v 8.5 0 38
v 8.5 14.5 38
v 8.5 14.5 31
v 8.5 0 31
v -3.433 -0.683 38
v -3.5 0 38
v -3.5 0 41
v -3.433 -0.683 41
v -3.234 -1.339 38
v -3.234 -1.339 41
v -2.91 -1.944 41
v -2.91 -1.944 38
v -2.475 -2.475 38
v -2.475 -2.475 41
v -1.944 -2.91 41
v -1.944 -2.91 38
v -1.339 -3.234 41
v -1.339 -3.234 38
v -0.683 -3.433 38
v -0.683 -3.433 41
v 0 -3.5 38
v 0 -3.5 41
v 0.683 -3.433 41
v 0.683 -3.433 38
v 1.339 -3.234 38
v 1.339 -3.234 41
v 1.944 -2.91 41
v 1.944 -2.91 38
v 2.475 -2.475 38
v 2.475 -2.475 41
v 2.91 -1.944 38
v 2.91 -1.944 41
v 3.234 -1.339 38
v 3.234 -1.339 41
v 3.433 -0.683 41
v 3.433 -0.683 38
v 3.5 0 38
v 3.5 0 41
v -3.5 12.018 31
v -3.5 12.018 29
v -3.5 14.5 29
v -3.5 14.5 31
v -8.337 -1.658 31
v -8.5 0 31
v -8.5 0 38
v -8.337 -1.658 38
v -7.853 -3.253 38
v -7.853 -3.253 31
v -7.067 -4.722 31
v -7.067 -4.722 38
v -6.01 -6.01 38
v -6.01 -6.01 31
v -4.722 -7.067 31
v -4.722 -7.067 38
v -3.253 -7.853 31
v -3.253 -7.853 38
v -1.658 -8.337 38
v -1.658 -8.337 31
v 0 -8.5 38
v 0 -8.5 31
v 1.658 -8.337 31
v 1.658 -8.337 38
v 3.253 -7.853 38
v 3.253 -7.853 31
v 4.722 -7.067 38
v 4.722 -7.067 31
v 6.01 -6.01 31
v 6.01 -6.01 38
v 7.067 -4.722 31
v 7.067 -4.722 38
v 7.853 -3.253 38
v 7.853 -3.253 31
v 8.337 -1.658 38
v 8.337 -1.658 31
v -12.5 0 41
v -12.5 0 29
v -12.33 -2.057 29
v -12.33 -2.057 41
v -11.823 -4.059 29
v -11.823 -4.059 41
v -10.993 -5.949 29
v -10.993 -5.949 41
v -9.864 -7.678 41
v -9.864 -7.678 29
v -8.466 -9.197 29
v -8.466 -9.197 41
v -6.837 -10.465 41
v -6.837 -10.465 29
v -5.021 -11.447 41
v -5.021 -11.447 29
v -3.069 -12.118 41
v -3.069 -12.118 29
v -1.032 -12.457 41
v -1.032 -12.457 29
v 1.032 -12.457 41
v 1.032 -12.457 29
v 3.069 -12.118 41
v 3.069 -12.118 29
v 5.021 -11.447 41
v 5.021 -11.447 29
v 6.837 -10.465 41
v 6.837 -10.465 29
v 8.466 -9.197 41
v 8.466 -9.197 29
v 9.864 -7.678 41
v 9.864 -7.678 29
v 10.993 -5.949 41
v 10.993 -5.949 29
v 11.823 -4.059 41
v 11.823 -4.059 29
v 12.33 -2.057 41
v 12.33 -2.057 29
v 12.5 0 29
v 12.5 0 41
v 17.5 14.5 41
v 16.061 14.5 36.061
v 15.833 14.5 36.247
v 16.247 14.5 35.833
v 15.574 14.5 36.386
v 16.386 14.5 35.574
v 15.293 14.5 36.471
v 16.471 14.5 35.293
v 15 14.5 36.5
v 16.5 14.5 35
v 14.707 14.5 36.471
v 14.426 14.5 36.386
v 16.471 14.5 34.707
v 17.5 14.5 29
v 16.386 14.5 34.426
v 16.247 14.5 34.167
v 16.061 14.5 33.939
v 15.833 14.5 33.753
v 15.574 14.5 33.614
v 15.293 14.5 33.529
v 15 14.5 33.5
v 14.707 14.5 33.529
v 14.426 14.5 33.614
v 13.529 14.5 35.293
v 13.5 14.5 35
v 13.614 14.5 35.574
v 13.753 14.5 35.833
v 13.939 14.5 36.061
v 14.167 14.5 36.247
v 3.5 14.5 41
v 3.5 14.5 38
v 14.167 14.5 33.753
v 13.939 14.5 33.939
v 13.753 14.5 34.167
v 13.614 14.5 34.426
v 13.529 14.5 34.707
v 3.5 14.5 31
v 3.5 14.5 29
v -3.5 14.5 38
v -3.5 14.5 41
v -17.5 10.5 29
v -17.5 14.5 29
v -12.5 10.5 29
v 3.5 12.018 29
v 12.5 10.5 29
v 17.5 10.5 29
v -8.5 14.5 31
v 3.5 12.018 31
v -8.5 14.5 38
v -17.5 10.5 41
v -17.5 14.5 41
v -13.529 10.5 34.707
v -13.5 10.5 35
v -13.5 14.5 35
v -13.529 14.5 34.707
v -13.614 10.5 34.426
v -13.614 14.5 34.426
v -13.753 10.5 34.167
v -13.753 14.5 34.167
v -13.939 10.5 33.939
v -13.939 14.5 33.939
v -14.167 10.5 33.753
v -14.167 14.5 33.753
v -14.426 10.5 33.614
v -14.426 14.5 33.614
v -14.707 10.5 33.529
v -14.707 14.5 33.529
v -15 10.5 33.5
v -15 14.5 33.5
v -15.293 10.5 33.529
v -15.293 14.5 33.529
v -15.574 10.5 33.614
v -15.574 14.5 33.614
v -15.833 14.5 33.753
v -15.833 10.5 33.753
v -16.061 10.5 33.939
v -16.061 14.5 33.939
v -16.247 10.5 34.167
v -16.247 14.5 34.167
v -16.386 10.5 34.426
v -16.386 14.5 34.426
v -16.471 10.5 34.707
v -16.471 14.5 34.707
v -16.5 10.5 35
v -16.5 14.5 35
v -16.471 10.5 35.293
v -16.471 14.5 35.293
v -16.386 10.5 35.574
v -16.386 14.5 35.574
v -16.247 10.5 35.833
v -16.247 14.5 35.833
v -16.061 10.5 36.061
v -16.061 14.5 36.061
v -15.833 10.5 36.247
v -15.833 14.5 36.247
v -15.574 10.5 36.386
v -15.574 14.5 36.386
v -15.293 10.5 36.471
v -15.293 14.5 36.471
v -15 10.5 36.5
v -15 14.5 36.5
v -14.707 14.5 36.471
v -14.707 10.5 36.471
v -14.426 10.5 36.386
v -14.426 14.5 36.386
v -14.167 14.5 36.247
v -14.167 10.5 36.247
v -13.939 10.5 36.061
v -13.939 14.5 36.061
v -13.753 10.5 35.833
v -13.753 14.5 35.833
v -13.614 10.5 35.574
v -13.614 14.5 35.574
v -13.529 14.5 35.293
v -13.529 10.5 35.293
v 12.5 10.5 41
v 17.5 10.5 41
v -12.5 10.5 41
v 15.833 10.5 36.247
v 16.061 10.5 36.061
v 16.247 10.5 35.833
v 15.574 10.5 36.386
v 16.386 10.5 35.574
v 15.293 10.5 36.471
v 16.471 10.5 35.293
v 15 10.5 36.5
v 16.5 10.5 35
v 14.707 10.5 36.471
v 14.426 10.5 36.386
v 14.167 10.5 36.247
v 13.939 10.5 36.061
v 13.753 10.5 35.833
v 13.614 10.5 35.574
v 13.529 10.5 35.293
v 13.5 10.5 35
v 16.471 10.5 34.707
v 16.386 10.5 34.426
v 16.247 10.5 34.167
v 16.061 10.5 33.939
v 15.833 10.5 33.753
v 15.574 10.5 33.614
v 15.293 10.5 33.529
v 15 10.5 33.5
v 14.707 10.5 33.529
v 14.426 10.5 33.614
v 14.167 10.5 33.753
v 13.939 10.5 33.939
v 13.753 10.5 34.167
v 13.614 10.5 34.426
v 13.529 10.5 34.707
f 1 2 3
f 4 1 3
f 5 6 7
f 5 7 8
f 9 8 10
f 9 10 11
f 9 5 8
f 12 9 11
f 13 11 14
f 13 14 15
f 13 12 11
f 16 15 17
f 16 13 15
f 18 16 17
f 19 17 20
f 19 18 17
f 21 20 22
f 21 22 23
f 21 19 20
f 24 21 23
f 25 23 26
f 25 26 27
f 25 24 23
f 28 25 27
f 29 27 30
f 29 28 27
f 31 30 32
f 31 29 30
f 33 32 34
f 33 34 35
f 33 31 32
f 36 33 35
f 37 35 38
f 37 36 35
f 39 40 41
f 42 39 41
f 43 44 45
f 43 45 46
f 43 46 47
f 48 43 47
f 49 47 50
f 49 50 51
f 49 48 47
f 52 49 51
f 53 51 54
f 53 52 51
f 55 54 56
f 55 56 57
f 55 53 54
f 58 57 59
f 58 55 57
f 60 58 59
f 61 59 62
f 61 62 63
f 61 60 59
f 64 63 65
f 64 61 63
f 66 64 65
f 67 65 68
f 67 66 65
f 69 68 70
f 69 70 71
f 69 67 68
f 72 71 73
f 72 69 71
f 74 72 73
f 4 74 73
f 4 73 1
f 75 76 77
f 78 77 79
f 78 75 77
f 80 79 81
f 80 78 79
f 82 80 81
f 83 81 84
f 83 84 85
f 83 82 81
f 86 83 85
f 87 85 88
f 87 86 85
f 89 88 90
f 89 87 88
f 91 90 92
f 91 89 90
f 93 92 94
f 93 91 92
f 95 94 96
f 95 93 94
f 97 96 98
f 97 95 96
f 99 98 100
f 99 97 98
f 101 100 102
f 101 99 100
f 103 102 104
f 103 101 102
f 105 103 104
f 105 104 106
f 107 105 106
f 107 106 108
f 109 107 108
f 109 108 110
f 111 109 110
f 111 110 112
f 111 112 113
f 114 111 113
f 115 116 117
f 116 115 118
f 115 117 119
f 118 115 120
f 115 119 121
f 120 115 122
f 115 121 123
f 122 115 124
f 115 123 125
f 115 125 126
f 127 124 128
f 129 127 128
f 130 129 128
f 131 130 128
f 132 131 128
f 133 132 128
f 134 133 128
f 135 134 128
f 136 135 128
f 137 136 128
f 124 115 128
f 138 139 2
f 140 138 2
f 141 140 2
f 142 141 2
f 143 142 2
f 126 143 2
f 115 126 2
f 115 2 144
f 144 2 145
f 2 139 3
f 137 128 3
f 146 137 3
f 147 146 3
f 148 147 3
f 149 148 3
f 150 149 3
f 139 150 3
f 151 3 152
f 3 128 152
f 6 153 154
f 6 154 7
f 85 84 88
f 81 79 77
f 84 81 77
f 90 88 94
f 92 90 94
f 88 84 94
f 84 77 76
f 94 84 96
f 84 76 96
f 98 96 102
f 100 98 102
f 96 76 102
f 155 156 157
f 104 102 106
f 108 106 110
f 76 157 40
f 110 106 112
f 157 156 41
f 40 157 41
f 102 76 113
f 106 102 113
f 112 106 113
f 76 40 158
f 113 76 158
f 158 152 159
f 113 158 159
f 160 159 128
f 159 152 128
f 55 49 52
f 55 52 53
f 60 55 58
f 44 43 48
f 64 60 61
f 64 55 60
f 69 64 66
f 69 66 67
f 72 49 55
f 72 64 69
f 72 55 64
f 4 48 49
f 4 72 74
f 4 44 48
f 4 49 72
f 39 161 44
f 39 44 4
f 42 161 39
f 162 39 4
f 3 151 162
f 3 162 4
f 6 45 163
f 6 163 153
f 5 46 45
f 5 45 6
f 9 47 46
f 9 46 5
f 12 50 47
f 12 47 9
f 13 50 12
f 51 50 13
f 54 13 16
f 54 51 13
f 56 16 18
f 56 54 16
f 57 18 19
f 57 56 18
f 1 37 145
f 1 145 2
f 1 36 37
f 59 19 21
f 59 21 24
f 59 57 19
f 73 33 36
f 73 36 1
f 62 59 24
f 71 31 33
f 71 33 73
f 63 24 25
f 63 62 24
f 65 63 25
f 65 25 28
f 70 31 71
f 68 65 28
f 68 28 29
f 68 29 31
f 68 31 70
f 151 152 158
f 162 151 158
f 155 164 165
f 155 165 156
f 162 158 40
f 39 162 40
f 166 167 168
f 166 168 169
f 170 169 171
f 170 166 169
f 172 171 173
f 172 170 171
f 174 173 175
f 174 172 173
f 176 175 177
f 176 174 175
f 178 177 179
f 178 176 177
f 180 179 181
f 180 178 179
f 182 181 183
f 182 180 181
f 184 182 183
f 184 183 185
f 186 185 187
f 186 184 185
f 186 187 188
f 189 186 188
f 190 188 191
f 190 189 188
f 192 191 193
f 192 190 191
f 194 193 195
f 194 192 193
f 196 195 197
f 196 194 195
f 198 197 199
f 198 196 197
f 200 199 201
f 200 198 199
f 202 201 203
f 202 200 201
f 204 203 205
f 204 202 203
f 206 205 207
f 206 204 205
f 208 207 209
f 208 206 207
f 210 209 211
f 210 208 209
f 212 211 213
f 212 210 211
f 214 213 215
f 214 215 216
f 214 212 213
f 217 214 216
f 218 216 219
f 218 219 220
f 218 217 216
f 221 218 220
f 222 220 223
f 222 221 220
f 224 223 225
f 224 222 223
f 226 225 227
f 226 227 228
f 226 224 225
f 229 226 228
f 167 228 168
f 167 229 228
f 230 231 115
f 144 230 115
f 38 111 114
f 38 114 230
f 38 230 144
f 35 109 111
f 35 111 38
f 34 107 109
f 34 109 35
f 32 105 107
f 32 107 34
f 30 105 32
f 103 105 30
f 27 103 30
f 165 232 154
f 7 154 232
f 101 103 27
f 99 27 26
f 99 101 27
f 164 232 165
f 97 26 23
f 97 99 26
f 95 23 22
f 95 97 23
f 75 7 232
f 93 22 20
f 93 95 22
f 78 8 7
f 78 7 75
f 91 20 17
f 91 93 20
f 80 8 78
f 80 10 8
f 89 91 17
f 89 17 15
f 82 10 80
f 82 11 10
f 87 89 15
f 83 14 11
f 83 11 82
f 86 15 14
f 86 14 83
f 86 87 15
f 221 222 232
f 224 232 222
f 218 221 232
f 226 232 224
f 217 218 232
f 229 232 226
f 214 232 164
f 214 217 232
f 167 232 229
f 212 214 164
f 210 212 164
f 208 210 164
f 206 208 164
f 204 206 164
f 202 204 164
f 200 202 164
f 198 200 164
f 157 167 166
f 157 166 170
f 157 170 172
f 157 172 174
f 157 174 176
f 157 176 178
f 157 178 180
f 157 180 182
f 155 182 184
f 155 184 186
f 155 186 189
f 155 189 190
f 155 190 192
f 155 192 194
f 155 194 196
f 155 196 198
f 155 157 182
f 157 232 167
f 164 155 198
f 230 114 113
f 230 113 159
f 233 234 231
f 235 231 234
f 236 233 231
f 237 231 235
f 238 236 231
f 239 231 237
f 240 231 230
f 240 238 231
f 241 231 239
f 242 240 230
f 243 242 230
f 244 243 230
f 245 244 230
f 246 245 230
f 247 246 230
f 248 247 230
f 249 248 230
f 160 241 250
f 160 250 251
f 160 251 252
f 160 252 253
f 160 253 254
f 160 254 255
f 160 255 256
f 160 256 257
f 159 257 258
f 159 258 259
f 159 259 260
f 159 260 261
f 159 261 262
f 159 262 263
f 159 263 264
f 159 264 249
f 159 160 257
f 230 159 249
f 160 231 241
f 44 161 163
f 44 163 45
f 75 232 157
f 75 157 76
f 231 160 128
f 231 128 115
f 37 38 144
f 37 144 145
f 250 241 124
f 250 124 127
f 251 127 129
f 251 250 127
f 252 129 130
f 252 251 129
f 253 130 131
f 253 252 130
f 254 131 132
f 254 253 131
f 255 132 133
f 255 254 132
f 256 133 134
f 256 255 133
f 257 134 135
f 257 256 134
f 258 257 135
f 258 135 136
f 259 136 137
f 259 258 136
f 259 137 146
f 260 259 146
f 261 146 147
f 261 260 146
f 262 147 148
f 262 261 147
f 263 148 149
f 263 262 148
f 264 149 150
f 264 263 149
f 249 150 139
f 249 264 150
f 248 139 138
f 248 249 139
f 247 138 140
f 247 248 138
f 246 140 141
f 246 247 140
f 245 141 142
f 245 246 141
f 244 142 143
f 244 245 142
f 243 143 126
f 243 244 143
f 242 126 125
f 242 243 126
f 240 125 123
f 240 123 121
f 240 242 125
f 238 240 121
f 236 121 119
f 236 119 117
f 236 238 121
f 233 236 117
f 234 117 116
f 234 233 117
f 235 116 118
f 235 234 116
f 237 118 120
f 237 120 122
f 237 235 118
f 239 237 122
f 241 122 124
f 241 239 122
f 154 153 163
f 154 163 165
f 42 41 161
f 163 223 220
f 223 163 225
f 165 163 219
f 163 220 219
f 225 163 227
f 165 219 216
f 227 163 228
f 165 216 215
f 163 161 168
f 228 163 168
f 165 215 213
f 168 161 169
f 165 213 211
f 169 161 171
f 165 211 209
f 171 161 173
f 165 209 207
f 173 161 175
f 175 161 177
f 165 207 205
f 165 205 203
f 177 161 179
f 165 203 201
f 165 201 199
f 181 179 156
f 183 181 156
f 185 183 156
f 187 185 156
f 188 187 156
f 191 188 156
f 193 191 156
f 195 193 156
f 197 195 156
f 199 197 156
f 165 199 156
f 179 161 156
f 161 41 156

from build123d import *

# Parameters (mm, degrees)
SALIENTE_EXTRUIR1_DEPTH    = 38
SALIENTE_EXTRUIR2_DEPTH    = 3
SALIENTE_EXTRUIR3_DEPTH    = 2
CROQUIS4_R                 = 1.5
SALIENTE_EXTRUIR4_DEPTH    = 4
CROQUIS5_W                 = 35
CROQUIS5_H                 = 31
CORTAR_EXTRUIR1_DEPTH      = 24
CORTAR_EXTRUIR1_DEPTH_BACK = 5
SALIENTE_EXTRUIR5_DEPTH    = 2


with BuildPart() as part:
    # Croquis1 → Saliente-Extruir1 (new body)
    with BuildSketch(Plane.XY):
        with BuildLine():
            Line((10.5, 10.5), (12.5, 10.5))
            Line((12.5, 10.5), (12.5, 0))
            ThreePointArc((12.5, 0), (0, -12.5), (-12.5, 0))
            Line((-12.5, 0), (-12.5, 10.5))
            Line((-12.5, 10.5), (-10.5, 10.5))
            Line((-10.5, 10.5), (-8.5, 10.5))
            Line((-8.5, 10.5), (-8.5, 0))
            ThreePointArc((-8.5, 0), (0, -8.5), (8.5, 0))
            Line((8.5, 0), (8.5, 10.5))
            Line((8.5, 10.5), (10.5, 10.5))
        make_face()
    extrude(amount=SALIENTE_EXTRUIR1_DEPTH)

    # Croquis2 → Saliente-Extruir2 (add)
    with BuildSketch(Plane.XY.offset(38)):
        with BuildLine():
            Line((-12.5, 10.5), (-3.5, 10.5))
            Line((-3.5, 10.5), (-3.5, 0))
            ThreePointArc((-3.5, 0), (0, -3.5), (3.5, 0))
            Line((3.5, 0), (3.5, 10.5))
            Line((3.5, 10.5), (12.5, 10.5))
            Line((12.5, 10.5), (12.5, 0))
            ThreePointArc((12.5, 0), (0, -12.5), (-12.5, 0))
            Line((-12.5, 0), (-12.5, 10.5))
        make_face()
    extrude(amount=SALIENTE_EXTRUIR2_DEPTH)

    # Croquis3 → Saliente-Extruir3 (add)
    with BuildSketch(Plane(origin=(0, 0, 0), x_dir=(-1, 0, 0), z_dir=(0, 0, -1))):
        with BuildLine():
            Line((-12.5, 10.5), (12.5, 10.5))
            Line((12.5, 10.5), (12.5, 0))
            ThreePointArc((12.5, 0), (0, -12.5), (-12.5, 0))
            Line((-12.5, 0), (-12.5, 10.5))
        make_face()
    extrude(amount=SALIENTE_EXTRUIR3_DEPTH)

    # Croquis4 → Saliente-Extruir4 (add)
    with BuildSketch(Plane(origin=(0, 10.5, 0), x_dir=(1, 0, 0), z_dir=(0, 1, 0))):
        Polygon((17.5, -41), (3.5, -41), (3.5, -38), (8.5, -38), (8.5, -26.565627665), (17.5, -26.565627665), align=None)
        with Locations((15, -35)):
            Circle(CROQUIS4_R, mode=Mode.SUBTRACT)
        Polygon((-17.5, -41), (-17.5, -26.565627665), (-8.5, -26.565627665), (-8.5, -38), (-3.5, -38), (-3.5, -41), align=None)
        with Locations((-15, -35)):
            Circle(CROQUIS4_R, mode=Mode.SUBTRACT)
    extrude(amount=SALIENTE_EXTRUIR4_DEPTH)

    # Croquis5 → Cortar-Extruir1 (cut, two sides)
    with BuildSketch(Plane.XZ.offset(-10.5)) as cortar_extruir1_sk:
        with Locations((0, 13.5)):
            Rectangle(CROQUIS5_W, CROQUIS5_H)
    extrude(amount=CORTAR_EXTRUIR1_DEPTH, mode=Mode.SUBTRACT)
    extrude(cortar_extruir1_sk.sketch, amount=-CORTAR_EXTRUIR1_DEPTH_BACK, mode=Mode.SUBTRACT)

    # Croquis6 → Saliente-Extruir5 (add)
    with BuildSketch(Plane(origin=(0, 0, 29), x_dir=(-1, 0, 0), z_dir=(0, 0, -1))):
        with BuildLine():
            Line((-8.5, 14.5), (-3.5, 14.5))
            Line((-3.5, 14.5), (-3.5, 12.017542708))
            Line((-3.5, 12.017542708), (3.5, 12.017542708))
            Line((3.5, 12.017542708), (3.5, 14.5))
            Line((3.5, 14.5), (8.5, 14.5))
            Line((8.5, 14.5), (8.5, 0))
            ThreePointArc((8.5, 0), (0, -8.5), (-8.5, 0))
            Line((-8.5, 0), (-8.5, 14.5))
        make_face()
    extrude(amount=-SALIENTE_EXTRUIR5_DEPTH)


solid = part.part
